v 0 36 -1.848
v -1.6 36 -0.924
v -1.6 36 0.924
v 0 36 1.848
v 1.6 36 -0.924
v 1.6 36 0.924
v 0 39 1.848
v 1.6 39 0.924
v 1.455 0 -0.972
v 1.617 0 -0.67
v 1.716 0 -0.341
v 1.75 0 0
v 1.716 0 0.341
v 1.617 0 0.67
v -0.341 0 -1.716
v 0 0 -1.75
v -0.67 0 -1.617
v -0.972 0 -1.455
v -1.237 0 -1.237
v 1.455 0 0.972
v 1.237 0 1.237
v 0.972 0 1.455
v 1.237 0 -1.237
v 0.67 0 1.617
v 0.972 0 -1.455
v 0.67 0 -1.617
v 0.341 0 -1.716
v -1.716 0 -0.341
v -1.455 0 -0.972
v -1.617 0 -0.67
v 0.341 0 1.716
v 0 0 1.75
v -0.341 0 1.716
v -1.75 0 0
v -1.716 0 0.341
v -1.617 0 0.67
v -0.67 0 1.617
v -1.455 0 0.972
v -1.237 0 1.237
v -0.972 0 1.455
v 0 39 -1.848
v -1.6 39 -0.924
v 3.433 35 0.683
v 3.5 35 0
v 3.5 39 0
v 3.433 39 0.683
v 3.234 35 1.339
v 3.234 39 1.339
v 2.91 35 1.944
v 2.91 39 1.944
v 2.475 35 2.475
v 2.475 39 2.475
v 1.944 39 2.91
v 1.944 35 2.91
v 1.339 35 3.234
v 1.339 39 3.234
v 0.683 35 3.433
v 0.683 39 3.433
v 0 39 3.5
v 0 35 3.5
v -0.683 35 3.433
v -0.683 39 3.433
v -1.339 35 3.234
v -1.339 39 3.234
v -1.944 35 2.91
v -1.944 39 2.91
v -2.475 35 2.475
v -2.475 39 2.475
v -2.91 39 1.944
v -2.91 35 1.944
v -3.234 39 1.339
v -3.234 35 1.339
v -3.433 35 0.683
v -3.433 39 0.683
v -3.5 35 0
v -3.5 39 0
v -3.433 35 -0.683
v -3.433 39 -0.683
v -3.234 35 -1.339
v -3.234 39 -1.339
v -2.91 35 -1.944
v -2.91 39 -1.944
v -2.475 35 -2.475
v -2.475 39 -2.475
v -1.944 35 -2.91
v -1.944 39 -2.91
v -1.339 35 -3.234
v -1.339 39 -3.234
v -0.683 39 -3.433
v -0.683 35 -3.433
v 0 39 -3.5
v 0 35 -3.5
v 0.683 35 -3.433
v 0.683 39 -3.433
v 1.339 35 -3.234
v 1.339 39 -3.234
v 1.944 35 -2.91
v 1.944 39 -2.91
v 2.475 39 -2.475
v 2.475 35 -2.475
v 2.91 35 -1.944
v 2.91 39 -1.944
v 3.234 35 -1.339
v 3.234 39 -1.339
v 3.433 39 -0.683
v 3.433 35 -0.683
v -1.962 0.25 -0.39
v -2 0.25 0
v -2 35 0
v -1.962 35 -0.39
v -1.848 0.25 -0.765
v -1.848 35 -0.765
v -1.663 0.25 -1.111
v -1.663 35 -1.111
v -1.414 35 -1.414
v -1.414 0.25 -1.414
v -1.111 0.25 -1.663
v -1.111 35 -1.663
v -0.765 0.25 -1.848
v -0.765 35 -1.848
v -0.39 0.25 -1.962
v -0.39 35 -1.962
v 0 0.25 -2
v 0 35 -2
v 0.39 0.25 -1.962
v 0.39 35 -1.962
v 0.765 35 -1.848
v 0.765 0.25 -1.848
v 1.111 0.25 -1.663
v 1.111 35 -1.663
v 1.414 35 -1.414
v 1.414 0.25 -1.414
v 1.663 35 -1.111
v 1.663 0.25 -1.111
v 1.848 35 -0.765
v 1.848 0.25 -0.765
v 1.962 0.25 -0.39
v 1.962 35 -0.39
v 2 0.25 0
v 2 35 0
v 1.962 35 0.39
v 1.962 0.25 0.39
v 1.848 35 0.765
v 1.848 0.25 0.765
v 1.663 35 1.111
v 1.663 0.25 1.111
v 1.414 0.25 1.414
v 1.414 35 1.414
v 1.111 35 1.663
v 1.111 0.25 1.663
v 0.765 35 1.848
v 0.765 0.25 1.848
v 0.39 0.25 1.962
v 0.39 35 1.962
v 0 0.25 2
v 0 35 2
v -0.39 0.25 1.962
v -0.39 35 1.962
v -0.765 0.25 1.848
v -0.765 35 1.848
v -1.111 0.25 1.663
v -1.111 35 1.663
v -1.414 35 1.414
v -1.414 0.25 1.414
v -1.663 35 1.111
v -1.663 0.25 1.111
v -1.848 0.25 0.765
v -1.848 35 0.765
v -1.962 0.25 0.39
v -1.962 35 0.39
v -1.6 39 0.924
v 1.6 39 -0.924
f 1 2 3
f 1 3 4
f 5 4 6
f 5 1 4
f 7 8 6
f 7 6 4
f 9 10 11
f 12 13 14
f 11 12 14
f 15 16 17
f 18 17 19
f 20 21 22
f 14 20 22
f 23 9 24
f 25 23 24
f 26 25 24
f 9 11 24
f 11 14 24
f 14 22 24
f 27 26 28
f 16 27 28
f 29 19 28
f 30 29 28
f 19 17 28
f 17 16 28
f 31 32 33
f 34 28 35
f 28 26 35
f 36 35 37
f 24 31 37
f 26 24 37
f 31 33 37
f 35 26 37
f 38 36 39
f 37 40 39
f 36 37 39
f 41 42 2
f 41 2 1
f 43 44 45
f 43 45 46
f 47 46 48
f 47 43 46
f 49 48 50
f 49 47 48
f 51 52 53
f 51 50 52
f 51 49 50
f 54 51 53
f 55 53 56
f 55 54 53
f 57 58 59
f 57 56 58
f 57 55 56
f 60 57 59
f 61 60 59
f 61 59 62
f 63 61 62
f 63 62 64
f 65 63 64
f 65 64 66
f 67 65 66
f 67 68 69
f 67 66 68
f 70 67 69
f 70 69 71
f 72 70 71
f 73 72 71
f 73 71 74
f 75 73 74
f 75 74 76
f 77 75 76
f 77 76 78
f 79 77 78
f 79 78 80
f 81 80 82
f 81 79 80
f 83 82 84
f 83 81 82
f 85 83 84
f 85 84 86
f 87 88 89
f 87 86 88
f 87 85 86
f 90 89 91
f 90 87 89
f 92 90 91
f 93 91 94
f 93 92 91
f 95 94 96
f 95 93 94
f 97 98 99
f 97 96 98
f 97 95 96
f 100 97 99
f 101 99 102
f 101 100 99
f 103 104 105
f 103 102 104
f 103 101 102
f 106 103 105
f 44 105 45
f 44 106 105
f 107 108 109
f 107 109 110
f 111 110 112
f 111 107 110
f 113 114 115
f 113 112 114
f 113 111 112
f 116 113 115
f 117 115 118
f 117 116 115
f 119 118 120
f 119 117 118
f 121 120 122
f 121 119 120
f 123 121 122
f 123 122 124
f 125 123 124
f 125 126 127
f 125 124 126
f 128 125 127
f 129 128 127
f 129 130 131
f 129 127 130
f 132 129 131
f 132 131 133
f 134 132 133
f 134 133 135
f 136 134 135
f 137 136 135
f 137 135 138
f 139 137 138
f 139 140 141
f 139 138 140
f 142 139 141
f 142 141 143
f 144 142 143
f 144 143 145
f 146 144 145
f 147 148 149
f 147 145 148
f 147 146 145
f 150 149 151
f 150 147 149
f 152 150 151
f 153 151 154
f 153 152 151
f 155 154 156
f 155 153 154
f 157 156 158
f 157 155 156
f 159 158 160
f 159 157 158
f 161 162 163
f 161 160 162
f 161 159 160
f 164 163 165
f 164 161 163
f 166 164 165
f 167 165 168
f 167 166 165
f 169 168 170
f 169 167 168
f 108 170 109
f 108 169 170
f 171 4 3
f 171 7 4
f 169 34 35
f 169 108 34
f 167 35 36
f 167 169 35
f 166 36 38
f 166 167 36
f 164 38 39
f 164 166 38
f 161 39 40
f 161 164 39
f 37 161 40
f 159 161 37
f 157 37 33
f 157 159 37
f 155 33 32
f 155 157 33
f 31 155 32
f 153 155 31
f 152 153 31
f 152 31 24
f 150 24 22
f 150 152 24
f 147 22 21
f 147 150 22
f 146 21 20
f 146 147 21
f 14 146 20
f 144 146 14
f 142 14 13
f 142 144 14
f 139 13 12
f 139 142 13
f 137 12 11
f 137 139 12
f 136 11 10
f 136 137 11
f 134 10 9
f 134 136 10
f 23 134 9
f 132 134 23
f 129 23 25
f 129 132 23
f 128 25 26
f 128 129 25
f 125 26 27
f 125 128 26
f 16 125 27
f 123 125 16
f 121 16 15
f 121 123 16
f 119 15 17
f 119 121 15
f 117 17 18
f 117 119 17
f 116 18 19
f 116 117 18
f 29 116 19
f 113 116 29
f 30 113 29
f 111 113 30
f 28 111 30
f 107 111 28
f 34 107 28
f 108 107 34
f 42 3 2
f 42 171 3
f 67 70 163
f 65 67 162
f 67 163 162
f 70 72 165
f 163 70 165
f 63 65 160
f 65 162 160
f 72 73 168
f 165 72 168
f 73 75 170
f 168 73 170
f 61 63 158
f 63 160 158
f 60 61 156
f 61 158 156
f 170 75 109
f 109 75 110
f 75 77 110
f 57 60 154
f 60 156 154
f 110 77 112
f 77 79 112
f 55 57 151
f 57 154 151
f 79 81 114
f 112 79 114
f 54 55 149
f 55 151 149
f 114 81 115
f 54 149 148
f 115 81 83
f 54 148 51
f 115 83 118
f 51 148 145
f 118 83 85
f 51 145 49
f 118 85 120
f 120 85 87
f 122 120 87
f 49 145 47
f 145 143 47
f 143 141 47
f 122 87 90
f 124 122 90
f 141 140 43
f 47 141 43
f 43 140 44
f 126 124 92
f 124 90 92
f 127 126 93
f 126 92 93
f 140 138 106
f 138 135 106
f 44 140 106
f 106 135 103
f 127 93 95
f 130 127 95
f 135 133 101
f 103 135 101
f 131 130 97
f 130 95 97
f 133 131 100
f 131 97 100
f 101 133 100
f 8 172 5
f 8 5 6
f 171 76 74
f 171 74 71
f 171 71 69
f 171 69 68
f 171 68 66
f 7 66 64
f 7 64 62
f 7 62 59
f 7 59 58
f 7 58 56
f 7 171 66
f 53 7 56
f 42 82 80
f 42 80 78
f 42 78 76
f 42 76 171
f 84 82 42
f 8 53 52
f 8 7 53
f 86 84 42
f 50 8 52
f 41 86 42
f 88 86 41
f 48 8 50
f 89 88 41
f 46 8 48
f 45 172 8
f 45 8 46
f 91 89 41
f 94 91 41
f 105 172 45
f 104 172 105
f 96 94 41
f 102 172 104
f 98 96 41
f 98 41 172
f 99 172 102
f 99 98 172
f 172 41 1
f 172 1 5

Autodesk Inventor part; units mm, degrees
ref_plane "YZ Plane" through (0, 0, 0) normal (1, 0, 0) x (0, 1, 0)
ref_plane "XZ Plane" through (0, 0, 0) normal (0, 1, 0) x (-1, 0, 0)
ref_plane "XY Plane" through (0, 0, 0) normal (0, 0, 1) x (1, 0, 0)
sketch "Sketch1" plane through (0, 0, 0) normal (0, 1, 0) x (-1, 0, 0)
  circle A0 centre (0, 0) radius 2
  dimension "d0" = 4
extrude "Extrusion1" add sketch "Sketch1" along normal blind 35
sketch "Sketch2" plane through (0, 35, 0) normal (0, 1, 0) x (1, 0, 0)
  circle A0 centre (0, 0) radius 2 projected
  circle A1 centre (0, 0) radius 3.5
  dimension "d3" = 7
extrude "Extrusion2" add sketch "Sketch2" along normal blind 4 contours A0 | A1
sketch "Sketch3" plane through (0, 39, 0) normal (0, 1, 0) x (1, 0, 0)
  circle A0 centre (0, 0) radius 3.5 projected
  line L0 (0, 1.8475) -> (1.6, 0.9238)
  line L1 (1.6, 0.9238) -> (1.6, -0.9238)
  line L2 (1.6, -0.9238) -> (0, -1.8475)
  line L3 (0, -1.8475) -> (-1.6, -0.9238)
  line L4 (-1.6, -0.9238) -> (-1.6, 0.9238)
  line L5 (-1.6, 0.9238) -> (0, 1.8475)
  dimension "d6" = 1.6
extrude "Extrusion3" cut sketch "Sketch3" against normal blind 3 contours L0 L1 L2 L3 L4 L5
thread "Thread1" size "M4x0.7" class "6g" standard "ANSI Metric M Profile" full length
chamfer "Chamfer1" distance 0.25 angle 45 1 edges at (2, 0, 0)
properties part number "SHCS4x35"
